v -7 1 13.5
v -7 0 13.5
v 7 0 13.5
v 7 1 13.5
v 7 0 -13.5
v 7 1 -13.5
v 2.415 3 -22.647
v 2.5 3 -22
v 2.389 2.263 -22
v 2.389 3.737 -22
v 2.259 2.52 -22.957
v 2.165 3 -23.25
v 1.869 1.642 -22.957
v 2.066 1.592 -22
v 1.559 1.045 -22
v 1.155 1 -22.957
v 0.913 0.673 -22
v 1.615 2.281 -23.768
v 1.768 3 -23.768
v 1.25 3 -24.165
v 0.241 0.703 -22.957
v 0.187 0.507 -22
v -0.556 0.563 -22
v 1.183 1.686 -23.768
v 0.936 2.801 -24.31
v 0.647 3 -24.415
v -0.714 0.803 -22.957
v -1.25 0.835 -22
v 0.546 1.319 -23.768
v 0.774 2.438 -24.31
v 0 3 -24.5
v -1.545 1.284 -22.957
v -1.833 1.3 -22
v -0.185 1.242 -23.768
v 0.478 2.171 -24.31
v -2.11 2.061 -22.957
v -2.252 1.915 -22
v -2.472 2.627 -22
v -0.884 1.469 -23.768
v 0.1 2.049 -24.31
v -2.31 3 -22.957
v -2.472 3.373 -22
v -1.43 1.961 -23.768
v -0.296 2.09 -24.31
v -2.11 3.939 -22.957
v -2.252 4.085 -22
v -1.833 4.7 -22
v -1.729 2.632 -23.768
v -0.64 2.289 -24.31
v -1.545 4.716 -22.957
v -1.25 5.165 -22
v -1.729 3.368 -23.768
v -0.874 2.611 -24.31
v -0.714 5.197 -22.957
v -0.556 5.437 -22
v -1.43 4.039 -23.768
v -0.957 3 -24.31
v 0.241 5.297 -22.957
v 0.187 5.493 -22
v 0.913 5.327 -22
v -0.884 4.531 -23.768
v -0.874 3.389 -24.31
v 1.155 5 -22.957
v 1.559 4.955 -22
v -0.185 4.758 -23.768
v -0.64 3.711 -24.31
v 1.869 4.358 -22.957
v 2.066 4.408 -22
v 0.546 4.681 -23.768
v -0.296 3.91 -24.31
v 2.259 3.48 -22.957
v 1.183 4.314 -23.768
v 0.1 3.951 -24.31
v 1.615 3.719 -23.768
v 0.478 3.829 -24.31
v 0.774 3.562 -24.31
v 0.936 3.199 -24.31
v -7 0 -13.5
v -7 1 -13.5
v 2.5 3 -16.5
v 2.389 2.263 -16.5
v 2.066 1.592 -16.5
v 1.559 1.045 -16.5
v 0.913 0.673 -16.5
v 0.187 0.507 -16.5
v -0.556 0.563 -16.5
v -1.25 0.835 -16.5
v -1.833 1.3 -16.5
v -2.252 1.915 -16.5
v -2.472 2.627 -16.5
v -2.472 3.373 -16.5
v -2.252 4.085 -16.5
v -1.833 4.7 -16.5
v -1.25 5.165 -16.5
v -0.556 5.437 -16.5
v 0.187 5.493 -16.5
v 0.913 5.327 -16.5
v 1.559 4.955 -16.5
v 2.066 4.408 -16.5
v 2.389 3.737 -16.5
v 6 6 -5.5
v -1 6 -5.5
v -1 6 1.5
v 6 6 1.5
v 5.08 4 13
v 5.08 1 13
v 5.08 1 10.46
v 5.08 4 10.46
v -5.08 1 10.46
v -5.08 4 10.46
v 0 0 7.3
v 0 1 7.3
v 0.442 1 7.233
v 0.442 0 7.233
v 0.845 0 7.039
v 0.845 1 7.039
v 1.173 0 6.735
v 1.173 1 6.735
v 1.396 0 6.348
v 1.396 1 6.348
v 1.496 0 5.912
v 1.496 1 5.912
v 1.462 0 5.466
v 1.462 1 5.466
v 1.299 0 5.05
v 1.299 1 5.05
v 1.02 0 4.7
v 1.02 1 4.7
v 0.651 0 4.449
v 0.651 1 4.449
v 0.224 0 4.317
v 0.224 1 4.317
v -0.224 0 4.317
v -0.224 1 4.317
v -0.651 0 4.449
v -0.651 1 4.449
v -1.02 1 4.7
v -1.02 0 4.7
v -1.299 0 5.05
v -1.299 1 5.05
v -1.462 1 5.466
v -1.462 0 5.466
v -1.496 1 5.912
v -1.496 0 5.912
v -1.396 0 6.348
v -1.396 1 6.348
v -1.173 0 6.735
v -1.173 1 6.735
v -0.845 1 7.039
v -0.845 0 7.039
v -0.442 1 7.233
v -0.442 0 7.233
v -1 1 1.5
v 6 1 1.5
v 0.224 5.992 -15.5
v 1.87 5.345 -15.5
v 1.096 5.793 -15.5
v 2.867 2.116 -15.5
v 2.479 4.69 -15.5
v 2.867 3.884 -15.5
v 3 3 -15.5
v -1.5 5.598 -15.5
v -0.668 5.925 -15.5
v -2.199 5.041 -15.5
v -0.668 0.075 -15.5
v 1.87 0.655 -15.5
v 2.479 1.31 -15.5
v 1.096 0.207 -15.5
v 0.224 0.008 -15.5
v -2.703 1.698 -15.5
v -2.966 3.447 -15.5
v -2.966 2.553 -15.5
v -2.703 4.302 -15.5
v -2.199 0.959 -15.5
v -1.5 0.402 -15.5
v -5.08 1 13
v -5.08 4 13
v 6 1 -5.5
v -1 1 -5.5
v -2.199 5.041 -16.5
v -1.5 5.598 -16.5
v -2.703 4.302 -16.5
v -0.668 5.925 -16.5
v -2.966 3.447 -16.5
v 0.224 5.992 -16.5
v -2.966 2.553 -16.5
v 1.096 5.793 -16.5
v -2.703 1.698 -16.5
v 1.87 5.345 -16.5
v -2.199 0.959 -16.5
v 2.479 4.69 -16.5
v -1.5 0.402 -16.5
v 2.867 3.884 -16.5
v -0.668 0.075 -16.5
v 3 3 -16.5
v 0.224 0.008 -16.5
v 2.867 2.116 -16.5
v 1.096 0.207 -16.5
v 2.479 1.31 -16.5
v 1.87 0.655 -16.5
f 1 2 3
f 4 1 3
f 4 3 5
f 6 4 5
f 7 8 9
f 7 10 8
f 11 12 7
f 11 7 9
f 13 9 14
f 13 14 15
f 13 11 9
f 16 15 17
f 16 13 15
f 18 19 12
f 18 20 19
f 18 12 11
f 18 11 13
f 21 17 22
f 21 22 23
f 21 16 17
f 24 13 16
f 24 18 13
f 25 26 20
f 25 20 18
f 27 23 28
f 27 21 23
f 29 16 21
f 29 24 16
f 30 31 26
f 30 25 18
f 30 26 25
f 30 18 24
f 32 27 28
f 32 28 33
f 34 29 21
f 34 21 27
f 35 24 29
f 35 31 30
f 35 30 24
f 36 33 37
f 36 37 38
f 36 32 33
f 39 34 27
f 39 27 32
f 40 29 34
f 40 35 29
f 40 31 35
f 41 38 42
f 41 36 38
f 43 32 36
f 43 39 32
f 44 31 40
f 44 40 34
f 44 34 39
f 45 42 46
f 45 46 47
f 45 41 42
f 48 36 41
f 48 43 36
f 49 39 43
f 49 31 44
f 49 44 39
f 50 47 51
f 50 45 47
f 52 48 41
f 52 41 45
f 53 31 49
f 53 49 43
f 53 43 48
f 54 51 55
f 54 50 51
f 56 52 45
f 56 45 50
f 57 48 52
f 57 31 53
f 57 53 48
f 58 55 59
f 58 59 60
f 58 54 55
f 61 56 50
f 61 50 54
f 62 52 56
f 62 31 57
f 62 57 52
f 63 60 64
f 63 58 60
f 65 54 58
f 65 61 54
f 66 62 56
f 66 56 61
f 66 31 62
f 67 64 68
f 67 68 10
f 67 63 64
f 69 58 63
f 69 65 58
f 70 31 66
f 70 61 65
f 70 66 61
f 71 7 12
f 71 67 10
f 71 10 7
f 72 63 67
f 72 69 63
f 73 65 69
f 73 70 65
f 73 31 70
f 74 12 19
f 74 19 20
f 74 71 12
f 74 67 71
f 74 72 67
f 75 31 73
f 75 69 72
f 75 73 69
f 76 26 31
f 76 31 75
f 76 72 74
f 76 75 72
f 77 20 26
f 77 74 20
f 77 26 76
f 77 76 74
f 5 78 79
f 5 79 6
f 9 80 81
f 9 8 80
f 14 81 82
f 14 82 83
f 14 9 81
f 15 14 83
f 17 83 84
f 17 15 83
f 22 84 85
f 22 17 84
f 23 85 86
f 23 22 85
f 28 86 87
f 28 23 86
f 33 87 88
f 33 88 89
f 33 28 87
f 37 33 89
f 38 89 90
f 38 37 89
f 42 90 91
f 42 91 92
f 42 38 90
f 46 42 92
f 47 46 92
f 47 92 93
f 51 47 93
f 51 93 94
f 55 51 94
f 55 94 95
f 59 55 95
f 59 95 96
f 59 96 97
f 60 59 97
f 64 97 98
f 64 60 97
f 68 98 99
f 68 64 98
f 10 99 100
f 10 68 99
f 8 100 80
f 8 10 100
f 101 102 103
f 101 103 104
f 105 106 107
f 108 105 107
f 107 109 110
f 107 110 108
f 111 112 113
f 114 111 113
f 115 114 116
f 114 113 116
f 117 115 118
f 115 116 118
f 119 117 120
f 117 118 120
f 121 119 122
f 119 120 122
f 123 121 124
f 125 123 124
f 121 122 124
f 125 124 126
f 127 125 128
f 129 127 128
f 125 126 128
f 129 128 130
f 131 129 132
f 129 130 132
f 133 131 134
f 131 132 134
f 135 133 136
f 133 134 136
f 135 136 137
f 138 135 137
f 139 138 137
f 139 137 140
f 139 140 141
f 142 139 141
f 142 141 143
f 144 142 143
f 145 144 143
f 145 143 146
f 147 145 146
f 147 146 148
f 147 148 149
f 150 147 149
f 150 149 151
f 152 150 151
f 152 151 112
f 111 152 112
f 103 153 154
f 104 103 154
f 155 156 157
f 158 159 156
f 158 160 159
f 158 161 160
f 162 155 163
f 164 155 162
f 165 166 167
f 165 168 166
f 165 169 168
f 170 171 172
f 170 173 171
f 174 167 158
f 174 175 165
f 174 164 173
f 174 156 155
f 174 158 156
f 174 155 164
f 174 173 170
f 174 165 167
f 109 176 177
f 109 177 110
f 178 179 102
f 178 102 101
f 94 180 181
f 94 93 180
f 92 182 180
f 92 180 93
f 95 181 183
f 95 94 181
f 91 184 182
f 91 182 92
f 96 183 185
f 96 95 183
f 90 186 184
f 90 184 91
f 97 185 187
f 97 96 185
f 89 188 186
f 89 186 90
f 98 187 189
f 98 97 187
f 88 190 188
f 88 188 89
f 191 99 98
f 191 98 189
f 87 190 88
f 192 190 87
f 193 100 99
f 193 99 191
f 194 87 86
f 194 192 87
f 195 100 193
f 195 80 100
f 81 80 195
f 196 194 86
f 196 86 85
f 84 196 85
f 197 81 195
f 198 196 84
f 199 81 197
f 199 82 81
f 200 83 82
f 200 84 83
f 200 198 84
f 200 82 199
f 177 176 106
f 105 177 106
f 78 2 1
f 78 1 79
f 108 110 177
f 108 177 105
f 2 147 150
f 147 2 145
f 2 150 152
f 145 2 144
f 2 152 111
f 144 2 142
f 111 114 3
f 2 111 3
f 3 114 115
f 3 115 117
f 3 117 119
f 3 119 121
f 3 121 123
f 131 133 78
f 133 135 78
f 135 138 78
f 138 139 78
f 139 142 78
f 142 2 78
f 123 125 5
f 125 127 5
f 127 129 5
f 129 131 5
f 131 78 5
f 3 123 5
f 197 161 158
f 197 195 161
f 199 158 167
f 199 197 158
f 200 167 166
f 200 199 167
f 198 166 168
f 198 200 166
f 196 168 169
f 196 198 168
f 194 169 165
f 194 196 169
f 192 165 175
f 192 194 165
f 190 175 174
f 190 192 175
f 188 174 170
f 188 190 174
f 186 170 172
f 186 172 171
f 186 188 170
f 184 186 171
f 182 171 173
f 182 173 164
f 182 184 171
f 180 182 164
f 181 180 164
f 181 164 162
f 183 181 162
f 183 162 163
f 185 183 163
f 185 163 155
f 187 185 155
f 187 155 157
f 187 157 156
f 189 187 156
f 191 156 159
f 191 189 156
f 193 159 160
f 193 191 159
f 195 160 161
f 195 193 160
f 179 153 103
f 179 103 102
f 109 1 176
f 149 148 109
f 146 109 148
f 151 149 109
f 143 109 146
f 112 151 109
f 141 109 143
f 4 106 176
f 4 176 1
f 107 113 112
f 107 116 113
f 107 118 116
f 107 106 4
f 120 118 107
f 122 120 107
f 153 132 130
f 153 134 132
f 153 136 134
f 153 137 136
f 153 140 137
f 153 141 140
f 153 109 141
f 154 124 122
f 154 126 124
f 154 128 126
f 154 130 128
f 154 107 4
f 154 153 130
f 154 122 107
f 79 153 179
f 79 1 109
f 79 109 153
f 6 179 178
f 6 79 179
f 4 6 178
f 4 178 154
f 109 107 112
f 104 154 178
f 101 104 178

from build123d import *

# Parameters (mm, degrees)
SKETCH1_W           = 14
SKETCH1_H           = 27
BOSS_EXTRUDE1_DEPTH = 1
SKETCH2_R           = 1.5
CUT_EXTRUDE1_DEPTH  = 16.239750654
SKETCH3_W           = 7
SKETCH3_H           = 7
BOSS_EXTRUDE2_DEPTH = 5
SKETCH4_W           = 10.16
SKETCH4_H           = 2.54
BOSS_EXTRUDE3_DEPTH = 3


with BuildPart() as part:
    # Sketch1 → Boss-Extrude1 (new body)
    with BuildSketch(Plane(origin=(0, 0, 0), x_dir=(1, 0, 0), z_dir=(0, 1, 0))):
        Rectangle(SKETCH1_W, SKETCH1_H)
    extrude(amount=BOSS_EXTRUDE1_DEPTH)

    # Sketch2 → Cut-Extrude1 (cut, through all)
    with BuildSketch(Plane(origin=(0, 1, 0), x_dir=(1, 0, 0), z_dir=(0, 1, 0))):
        with Locations(Location((0, -5.8, 0), (0, 0, 270))):
            Circle(SKETCH2_R)
    extrude(amount=-CUT_EXTRUDE1_DEPTH, mode=Mode.SUBTRACT)

    # Sketch3 → Boss-Extrude2 (add)
    with BuildSketch(Plane(origin=(0, 1, 0), x_dir=(1, 0, 0), z_dir=(0, 1, 0))):
        with Locations((2.5, 2)):
            Rectangle(SKETCH3_W, SKETCH3_H)
    extrude(amount=BOSS_EXTRUDE2_DEPTH)

    # Sketch4 → Boss-Extrude3 (add)
    with BuildSketch(Plane(origin=(0, 1, 0), x_dir=(1, 0, 0), z_dir=(0, 1, 0))):
        with Locations((0, -11.73)):
            Rectangle(SKETCH4_W, SKETCH4_H)
    extrude(amount=BOSS_EXTRUDE3_DEPTH)


with BuildPart() as body_2:
    # Sketch5 → Revolve1 (revolve)
    with BuildSketch(Plane(origin=(0, 0, 0), x_dir=(0, 0, -1), z_dir=(1, 0, 0)), mode=Mode.PRIVATE) as revolve1_sk:
        with BuildLine():
            Line((15.5, 3), (15.5, 6))
            Line((15.5, 6), (16.5, 6))
            Line((16.5, 6), (16.5, 5.5))
            Line((16.5, 5.5), (22, 5.5))
            ThreePointArc((22, 5.5), (23.767766953, 4.767766953), (24.5, 3))
            Line((24.5, 3), (15.5, 3))
        make_face()
    revolve(revolve1_sk.sketch.rotate(Axis((0, 3, -15.5), (0, 0, -1)), 90), axis=Axis((0, 3, -15.5), (0, 0, -1)))


solid = Compound([part.part, body_2.part])
